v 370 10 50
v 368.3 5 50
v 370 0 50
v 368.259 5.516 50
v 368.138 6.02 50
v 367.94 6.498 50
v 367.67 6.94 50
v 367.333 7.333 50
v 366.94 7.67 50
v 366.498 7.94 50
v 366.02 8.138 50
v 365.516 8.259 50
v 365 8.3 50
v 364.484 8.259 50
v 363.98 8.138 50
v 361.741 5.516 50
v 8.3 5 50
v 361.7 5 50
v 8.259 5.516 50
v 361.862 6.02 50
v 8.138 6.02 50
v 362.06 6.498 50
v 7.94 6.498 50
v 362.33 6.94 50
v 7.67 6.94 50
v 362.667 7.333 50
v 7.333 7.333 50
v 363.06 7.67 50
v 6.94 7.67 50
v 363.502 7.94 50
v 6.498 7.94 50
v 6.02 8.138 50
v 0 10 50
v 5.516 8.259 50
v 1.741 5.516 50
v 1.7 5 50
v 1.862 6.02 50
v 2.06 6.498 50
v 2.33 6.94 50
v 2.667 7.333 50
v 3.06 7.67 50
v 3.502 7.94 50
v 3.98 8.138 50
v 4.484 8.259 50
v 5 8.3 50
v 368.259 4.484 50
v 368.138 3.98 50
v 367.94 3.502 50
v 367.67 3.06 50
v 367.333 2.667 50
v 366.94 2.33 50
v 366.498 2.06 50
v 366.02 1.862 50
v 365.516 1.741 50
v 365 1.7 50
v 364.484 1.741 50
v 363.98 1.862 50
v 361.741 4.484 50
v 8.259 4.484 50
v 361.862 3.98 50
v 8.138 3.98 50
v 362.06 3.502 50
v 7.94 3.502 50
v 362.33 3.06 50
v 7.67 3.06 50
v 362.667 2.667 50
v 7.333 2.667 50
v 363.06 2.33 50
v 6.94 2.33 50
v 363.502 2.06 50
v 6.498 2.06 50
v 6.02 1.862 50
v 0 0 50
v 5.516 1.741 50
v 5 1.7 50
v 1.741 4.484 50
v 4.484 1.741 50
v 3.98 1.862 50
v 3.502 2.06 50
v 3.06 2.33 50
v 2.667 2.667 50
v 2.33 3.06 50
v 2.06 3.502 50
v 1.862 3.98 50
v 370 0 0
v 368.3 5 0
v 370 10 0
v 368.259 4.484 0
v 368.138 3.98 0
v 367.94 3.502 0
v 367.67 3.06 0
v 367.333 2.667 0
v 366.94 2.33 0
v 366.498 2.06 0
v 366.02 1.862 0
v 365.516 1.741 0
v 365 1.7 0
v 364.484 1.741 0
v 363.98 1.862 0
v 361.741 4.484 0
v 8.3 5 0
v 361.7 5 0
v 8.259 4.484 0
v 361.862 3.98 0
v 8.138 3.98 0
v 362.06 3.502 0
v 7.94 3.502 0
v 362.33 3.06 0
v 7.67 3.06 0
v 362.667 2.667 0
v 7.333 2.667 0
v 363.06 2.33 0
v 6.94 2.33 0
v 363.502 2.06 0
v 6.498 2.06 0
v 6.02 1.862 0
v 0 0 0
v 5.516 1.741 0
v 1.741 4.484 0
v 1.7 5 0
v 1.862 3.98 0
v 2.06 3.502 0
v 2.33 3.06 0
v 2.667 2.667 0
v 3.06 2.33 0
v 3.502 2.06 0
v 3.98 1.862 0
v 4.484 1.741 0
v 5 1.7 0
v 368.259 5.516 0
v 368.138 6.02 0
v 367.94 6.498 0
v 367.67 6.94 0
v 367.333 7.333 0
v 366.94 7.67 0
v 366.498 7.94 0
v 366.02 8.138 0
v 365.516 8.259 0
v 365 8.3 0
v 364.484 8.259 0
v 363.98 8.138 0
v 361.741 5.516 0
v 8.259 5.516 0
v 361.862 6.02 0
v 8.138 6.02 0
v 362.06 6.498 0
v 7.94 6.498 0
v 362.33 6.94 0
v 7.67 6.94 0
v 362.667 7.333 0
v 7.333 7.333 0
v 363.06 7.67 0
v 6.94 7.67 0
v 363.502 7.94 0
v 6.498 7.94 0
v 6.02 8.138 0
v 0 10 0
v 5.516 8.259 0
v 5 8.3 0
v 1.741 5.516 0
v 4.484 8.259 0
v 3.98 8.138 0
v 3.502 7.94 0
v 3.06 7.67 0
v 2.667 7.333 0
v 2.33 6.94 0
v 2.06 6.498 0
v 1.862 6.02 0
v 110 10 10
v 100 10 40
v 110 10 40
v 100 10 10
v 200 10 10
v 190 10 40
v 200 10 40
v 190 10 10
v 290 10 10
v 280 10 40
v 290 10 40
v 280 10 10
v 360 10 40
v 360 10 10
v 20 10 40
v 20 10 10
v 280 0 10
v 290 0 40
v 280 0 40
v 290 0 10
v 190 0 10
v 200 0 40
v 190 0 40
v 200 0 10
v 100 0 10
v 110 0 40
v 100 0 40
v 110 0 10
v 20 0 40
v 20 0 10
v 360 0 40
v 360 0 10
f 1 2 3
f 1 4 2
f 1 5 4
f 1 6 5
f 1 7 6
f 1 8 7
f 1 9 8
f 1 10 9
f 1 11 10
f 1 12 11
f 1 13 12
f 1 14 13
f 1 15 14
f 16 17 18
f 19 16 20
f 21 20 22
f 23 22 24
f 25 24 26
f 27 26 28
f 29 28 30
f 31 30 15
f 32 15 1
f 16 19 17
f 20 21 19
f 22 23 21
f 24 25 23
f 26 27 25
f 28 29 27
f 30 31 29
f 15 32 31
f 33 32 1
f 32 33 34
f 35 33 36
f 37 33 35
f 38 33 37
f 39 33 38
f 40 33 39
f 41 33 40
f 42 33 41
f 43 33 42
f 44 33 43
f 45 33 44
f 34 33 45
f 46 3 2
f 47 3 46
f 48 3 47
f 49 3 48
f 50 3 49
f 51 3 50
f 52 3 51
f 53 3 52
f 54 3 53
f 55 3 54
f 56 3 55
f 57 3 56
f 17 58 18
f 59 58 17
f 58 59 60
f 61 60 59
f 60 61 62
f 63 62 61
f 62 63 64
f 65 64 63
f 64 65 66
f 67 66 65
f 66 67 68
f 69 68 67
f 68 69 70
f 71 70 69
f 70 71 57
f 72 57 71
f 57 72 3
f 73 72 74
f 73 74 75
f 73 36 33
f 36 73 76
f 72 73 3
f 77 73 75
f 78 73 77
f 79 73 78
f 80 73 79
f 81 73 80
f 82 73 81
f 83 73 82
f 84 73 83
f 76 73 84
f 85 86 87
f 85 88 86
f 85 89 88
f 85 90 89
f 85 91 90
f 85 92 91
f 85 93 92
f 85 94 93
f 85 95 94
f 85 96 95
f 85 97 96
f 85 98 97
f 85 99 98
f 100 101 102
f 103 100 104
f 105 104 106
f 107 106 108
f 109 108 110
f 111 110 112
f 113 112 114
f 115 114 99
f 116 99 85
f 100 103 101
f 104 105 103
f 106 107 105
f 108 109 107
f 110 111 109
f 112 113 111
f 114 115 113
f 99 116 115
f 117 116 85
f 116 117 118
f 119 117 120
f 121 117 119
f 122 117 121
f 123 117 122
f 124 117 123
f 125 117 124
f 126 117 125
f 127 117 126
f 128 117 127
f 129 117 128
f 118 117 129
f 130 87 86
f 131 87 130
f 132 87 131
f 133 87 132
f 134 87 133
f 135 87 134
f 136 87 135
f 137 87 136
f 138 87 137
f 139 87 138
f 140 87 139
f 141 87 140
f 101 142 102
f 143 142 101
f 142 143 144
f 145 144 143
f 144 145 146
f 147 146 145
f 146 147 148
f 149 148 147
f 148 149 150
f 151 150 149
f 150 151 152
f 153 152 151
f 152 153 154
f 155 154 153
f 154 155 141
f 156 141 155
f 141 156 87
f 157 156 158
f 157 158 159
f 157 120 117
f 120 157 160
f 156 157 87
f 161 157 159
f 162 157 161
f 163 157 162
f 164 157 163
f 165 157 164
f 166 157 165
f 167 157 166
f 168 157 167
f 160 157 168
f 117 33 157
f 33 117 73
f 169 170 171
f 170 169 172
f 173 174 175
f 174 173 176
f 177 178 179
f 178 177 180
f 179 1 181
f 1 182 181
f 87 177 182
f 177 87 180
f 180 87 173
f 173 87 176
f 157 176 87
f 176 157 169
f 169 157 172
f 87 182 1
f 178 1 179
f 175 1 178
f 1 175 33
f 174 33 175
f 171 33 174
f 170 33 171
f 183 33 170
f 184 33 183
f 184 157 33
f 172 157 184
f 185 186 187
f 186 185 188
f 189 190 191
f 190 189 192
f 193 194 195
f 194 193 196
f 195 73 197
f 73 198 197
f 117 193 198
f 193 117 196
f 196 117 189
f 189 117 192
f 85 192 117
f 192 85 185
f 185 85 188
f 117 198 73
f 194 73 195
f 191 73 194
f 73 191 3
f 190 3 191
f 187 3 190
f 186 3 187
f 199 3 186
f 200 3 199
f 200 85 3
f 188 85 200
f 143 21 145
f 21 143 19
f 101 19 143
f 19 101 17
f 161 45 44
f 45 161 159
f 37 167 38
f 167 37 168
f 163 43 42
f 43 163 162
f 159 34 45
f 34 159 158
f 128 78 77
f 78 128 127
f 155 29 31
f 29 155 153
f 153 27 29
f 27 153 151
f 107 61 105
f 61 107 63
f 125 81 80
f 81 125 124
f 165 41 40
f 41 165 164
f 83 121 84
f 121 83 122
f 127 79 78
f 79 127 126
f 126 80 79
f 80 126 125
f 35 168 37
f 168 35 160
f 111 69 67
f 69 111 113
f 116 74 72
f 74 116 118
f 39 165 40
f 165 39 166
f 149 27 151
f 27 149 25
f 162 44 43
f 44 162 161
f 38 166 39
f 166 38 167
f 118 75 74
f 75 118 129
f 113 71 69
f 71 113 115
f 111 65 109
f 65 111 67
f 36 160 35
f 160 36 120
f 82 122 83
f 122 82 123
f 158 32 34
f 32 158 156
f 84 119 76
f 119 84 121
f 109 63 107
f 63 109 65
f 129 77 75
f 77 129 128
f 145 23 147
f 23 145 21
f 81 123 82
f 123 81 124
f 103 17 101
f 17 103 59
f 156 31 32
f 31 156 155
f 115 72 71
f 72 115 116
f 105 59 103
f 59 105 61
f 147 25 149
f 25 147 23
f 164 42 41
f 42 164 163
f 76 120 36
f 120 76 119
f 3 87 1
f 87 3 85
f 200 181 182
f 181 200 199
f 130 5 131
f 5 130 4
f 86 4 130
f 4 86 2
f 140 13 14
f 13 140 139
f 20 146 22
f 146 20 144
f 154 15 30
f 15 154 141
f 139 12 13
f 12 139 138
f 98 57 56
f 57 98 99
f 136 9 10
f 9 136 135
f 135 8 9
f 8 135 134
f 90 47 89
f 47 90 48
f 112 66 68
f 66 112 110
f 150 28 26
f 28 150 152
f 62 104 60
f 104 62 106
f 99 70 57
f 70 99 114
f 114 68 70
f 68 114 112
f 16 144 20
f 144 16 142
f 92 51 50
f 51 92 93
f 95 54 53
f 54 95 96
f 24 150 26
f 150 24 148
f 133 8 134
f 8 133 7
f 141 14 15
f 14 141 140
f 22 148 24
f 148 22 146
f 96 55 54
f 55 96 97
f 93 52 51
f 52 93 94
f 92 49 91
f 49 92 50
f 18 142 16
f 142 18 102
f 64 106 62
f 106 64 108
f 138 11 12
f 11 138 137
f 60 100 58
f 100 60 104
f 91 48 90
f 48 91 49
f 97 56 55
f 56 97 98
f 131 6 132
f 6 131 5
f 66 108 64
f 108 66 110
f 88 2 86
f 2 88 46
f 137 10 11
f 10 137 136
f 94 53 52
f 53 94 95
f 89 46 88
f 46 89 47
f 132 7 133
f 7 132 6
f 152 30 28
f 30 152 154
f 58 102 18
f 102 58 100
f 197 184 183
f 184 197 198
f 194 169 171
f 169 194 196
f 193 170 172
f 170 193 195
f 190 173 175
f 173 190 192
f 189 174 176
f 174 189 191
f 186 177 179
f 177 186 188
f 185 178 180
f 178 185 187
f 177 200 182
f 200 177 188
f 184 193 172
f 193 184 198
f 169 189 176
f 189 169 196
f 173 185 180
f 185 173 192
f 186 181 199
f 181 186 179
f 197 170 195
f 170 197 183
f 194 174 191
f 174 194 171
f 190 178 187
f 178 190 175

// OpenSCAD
// cage_side_yneg.scad
// Generates one 50mm-tall side band for the -Y wall.
bar = 10;
inner = 350;
segH = 50;
holeD = 6.6;
gap = 80;
outer = inner + 2 * bar;

module corner_block()
{
  difference()
  {
    cube([bar, bar, segH], center = false);
    translate([bar / 2, bar / 2, 0]) cylinder(d = holeD, h = segH, $fn = 40);
  }
}

module side_band_y()
{
  union()
  {
    translate([0, 0, 0]) corner_block();
    translate([outer -bar, 0, 0]) corner_block();
    translate([bar, 0, 0]) cube([outer -2 * bar, bar, bar], center = false);
    translate([bar, 0, segH -bar]) cube([outer -2 * bar, bar, bar], center = false);
    x0 = bar;
    maxX = outer -bar;
    L = inner;
    n = floor((L + gap) / (bar + gap));
    for(k = [0:n])
    {
      x = x0 + k * (bar + gap);
      if(x + bar <= maxX + 1e-6)
      {
        translate([x, 0, 0]) cube([bar, bar, segH], center = false);
      }
    }
  }
}

side_band_y();
